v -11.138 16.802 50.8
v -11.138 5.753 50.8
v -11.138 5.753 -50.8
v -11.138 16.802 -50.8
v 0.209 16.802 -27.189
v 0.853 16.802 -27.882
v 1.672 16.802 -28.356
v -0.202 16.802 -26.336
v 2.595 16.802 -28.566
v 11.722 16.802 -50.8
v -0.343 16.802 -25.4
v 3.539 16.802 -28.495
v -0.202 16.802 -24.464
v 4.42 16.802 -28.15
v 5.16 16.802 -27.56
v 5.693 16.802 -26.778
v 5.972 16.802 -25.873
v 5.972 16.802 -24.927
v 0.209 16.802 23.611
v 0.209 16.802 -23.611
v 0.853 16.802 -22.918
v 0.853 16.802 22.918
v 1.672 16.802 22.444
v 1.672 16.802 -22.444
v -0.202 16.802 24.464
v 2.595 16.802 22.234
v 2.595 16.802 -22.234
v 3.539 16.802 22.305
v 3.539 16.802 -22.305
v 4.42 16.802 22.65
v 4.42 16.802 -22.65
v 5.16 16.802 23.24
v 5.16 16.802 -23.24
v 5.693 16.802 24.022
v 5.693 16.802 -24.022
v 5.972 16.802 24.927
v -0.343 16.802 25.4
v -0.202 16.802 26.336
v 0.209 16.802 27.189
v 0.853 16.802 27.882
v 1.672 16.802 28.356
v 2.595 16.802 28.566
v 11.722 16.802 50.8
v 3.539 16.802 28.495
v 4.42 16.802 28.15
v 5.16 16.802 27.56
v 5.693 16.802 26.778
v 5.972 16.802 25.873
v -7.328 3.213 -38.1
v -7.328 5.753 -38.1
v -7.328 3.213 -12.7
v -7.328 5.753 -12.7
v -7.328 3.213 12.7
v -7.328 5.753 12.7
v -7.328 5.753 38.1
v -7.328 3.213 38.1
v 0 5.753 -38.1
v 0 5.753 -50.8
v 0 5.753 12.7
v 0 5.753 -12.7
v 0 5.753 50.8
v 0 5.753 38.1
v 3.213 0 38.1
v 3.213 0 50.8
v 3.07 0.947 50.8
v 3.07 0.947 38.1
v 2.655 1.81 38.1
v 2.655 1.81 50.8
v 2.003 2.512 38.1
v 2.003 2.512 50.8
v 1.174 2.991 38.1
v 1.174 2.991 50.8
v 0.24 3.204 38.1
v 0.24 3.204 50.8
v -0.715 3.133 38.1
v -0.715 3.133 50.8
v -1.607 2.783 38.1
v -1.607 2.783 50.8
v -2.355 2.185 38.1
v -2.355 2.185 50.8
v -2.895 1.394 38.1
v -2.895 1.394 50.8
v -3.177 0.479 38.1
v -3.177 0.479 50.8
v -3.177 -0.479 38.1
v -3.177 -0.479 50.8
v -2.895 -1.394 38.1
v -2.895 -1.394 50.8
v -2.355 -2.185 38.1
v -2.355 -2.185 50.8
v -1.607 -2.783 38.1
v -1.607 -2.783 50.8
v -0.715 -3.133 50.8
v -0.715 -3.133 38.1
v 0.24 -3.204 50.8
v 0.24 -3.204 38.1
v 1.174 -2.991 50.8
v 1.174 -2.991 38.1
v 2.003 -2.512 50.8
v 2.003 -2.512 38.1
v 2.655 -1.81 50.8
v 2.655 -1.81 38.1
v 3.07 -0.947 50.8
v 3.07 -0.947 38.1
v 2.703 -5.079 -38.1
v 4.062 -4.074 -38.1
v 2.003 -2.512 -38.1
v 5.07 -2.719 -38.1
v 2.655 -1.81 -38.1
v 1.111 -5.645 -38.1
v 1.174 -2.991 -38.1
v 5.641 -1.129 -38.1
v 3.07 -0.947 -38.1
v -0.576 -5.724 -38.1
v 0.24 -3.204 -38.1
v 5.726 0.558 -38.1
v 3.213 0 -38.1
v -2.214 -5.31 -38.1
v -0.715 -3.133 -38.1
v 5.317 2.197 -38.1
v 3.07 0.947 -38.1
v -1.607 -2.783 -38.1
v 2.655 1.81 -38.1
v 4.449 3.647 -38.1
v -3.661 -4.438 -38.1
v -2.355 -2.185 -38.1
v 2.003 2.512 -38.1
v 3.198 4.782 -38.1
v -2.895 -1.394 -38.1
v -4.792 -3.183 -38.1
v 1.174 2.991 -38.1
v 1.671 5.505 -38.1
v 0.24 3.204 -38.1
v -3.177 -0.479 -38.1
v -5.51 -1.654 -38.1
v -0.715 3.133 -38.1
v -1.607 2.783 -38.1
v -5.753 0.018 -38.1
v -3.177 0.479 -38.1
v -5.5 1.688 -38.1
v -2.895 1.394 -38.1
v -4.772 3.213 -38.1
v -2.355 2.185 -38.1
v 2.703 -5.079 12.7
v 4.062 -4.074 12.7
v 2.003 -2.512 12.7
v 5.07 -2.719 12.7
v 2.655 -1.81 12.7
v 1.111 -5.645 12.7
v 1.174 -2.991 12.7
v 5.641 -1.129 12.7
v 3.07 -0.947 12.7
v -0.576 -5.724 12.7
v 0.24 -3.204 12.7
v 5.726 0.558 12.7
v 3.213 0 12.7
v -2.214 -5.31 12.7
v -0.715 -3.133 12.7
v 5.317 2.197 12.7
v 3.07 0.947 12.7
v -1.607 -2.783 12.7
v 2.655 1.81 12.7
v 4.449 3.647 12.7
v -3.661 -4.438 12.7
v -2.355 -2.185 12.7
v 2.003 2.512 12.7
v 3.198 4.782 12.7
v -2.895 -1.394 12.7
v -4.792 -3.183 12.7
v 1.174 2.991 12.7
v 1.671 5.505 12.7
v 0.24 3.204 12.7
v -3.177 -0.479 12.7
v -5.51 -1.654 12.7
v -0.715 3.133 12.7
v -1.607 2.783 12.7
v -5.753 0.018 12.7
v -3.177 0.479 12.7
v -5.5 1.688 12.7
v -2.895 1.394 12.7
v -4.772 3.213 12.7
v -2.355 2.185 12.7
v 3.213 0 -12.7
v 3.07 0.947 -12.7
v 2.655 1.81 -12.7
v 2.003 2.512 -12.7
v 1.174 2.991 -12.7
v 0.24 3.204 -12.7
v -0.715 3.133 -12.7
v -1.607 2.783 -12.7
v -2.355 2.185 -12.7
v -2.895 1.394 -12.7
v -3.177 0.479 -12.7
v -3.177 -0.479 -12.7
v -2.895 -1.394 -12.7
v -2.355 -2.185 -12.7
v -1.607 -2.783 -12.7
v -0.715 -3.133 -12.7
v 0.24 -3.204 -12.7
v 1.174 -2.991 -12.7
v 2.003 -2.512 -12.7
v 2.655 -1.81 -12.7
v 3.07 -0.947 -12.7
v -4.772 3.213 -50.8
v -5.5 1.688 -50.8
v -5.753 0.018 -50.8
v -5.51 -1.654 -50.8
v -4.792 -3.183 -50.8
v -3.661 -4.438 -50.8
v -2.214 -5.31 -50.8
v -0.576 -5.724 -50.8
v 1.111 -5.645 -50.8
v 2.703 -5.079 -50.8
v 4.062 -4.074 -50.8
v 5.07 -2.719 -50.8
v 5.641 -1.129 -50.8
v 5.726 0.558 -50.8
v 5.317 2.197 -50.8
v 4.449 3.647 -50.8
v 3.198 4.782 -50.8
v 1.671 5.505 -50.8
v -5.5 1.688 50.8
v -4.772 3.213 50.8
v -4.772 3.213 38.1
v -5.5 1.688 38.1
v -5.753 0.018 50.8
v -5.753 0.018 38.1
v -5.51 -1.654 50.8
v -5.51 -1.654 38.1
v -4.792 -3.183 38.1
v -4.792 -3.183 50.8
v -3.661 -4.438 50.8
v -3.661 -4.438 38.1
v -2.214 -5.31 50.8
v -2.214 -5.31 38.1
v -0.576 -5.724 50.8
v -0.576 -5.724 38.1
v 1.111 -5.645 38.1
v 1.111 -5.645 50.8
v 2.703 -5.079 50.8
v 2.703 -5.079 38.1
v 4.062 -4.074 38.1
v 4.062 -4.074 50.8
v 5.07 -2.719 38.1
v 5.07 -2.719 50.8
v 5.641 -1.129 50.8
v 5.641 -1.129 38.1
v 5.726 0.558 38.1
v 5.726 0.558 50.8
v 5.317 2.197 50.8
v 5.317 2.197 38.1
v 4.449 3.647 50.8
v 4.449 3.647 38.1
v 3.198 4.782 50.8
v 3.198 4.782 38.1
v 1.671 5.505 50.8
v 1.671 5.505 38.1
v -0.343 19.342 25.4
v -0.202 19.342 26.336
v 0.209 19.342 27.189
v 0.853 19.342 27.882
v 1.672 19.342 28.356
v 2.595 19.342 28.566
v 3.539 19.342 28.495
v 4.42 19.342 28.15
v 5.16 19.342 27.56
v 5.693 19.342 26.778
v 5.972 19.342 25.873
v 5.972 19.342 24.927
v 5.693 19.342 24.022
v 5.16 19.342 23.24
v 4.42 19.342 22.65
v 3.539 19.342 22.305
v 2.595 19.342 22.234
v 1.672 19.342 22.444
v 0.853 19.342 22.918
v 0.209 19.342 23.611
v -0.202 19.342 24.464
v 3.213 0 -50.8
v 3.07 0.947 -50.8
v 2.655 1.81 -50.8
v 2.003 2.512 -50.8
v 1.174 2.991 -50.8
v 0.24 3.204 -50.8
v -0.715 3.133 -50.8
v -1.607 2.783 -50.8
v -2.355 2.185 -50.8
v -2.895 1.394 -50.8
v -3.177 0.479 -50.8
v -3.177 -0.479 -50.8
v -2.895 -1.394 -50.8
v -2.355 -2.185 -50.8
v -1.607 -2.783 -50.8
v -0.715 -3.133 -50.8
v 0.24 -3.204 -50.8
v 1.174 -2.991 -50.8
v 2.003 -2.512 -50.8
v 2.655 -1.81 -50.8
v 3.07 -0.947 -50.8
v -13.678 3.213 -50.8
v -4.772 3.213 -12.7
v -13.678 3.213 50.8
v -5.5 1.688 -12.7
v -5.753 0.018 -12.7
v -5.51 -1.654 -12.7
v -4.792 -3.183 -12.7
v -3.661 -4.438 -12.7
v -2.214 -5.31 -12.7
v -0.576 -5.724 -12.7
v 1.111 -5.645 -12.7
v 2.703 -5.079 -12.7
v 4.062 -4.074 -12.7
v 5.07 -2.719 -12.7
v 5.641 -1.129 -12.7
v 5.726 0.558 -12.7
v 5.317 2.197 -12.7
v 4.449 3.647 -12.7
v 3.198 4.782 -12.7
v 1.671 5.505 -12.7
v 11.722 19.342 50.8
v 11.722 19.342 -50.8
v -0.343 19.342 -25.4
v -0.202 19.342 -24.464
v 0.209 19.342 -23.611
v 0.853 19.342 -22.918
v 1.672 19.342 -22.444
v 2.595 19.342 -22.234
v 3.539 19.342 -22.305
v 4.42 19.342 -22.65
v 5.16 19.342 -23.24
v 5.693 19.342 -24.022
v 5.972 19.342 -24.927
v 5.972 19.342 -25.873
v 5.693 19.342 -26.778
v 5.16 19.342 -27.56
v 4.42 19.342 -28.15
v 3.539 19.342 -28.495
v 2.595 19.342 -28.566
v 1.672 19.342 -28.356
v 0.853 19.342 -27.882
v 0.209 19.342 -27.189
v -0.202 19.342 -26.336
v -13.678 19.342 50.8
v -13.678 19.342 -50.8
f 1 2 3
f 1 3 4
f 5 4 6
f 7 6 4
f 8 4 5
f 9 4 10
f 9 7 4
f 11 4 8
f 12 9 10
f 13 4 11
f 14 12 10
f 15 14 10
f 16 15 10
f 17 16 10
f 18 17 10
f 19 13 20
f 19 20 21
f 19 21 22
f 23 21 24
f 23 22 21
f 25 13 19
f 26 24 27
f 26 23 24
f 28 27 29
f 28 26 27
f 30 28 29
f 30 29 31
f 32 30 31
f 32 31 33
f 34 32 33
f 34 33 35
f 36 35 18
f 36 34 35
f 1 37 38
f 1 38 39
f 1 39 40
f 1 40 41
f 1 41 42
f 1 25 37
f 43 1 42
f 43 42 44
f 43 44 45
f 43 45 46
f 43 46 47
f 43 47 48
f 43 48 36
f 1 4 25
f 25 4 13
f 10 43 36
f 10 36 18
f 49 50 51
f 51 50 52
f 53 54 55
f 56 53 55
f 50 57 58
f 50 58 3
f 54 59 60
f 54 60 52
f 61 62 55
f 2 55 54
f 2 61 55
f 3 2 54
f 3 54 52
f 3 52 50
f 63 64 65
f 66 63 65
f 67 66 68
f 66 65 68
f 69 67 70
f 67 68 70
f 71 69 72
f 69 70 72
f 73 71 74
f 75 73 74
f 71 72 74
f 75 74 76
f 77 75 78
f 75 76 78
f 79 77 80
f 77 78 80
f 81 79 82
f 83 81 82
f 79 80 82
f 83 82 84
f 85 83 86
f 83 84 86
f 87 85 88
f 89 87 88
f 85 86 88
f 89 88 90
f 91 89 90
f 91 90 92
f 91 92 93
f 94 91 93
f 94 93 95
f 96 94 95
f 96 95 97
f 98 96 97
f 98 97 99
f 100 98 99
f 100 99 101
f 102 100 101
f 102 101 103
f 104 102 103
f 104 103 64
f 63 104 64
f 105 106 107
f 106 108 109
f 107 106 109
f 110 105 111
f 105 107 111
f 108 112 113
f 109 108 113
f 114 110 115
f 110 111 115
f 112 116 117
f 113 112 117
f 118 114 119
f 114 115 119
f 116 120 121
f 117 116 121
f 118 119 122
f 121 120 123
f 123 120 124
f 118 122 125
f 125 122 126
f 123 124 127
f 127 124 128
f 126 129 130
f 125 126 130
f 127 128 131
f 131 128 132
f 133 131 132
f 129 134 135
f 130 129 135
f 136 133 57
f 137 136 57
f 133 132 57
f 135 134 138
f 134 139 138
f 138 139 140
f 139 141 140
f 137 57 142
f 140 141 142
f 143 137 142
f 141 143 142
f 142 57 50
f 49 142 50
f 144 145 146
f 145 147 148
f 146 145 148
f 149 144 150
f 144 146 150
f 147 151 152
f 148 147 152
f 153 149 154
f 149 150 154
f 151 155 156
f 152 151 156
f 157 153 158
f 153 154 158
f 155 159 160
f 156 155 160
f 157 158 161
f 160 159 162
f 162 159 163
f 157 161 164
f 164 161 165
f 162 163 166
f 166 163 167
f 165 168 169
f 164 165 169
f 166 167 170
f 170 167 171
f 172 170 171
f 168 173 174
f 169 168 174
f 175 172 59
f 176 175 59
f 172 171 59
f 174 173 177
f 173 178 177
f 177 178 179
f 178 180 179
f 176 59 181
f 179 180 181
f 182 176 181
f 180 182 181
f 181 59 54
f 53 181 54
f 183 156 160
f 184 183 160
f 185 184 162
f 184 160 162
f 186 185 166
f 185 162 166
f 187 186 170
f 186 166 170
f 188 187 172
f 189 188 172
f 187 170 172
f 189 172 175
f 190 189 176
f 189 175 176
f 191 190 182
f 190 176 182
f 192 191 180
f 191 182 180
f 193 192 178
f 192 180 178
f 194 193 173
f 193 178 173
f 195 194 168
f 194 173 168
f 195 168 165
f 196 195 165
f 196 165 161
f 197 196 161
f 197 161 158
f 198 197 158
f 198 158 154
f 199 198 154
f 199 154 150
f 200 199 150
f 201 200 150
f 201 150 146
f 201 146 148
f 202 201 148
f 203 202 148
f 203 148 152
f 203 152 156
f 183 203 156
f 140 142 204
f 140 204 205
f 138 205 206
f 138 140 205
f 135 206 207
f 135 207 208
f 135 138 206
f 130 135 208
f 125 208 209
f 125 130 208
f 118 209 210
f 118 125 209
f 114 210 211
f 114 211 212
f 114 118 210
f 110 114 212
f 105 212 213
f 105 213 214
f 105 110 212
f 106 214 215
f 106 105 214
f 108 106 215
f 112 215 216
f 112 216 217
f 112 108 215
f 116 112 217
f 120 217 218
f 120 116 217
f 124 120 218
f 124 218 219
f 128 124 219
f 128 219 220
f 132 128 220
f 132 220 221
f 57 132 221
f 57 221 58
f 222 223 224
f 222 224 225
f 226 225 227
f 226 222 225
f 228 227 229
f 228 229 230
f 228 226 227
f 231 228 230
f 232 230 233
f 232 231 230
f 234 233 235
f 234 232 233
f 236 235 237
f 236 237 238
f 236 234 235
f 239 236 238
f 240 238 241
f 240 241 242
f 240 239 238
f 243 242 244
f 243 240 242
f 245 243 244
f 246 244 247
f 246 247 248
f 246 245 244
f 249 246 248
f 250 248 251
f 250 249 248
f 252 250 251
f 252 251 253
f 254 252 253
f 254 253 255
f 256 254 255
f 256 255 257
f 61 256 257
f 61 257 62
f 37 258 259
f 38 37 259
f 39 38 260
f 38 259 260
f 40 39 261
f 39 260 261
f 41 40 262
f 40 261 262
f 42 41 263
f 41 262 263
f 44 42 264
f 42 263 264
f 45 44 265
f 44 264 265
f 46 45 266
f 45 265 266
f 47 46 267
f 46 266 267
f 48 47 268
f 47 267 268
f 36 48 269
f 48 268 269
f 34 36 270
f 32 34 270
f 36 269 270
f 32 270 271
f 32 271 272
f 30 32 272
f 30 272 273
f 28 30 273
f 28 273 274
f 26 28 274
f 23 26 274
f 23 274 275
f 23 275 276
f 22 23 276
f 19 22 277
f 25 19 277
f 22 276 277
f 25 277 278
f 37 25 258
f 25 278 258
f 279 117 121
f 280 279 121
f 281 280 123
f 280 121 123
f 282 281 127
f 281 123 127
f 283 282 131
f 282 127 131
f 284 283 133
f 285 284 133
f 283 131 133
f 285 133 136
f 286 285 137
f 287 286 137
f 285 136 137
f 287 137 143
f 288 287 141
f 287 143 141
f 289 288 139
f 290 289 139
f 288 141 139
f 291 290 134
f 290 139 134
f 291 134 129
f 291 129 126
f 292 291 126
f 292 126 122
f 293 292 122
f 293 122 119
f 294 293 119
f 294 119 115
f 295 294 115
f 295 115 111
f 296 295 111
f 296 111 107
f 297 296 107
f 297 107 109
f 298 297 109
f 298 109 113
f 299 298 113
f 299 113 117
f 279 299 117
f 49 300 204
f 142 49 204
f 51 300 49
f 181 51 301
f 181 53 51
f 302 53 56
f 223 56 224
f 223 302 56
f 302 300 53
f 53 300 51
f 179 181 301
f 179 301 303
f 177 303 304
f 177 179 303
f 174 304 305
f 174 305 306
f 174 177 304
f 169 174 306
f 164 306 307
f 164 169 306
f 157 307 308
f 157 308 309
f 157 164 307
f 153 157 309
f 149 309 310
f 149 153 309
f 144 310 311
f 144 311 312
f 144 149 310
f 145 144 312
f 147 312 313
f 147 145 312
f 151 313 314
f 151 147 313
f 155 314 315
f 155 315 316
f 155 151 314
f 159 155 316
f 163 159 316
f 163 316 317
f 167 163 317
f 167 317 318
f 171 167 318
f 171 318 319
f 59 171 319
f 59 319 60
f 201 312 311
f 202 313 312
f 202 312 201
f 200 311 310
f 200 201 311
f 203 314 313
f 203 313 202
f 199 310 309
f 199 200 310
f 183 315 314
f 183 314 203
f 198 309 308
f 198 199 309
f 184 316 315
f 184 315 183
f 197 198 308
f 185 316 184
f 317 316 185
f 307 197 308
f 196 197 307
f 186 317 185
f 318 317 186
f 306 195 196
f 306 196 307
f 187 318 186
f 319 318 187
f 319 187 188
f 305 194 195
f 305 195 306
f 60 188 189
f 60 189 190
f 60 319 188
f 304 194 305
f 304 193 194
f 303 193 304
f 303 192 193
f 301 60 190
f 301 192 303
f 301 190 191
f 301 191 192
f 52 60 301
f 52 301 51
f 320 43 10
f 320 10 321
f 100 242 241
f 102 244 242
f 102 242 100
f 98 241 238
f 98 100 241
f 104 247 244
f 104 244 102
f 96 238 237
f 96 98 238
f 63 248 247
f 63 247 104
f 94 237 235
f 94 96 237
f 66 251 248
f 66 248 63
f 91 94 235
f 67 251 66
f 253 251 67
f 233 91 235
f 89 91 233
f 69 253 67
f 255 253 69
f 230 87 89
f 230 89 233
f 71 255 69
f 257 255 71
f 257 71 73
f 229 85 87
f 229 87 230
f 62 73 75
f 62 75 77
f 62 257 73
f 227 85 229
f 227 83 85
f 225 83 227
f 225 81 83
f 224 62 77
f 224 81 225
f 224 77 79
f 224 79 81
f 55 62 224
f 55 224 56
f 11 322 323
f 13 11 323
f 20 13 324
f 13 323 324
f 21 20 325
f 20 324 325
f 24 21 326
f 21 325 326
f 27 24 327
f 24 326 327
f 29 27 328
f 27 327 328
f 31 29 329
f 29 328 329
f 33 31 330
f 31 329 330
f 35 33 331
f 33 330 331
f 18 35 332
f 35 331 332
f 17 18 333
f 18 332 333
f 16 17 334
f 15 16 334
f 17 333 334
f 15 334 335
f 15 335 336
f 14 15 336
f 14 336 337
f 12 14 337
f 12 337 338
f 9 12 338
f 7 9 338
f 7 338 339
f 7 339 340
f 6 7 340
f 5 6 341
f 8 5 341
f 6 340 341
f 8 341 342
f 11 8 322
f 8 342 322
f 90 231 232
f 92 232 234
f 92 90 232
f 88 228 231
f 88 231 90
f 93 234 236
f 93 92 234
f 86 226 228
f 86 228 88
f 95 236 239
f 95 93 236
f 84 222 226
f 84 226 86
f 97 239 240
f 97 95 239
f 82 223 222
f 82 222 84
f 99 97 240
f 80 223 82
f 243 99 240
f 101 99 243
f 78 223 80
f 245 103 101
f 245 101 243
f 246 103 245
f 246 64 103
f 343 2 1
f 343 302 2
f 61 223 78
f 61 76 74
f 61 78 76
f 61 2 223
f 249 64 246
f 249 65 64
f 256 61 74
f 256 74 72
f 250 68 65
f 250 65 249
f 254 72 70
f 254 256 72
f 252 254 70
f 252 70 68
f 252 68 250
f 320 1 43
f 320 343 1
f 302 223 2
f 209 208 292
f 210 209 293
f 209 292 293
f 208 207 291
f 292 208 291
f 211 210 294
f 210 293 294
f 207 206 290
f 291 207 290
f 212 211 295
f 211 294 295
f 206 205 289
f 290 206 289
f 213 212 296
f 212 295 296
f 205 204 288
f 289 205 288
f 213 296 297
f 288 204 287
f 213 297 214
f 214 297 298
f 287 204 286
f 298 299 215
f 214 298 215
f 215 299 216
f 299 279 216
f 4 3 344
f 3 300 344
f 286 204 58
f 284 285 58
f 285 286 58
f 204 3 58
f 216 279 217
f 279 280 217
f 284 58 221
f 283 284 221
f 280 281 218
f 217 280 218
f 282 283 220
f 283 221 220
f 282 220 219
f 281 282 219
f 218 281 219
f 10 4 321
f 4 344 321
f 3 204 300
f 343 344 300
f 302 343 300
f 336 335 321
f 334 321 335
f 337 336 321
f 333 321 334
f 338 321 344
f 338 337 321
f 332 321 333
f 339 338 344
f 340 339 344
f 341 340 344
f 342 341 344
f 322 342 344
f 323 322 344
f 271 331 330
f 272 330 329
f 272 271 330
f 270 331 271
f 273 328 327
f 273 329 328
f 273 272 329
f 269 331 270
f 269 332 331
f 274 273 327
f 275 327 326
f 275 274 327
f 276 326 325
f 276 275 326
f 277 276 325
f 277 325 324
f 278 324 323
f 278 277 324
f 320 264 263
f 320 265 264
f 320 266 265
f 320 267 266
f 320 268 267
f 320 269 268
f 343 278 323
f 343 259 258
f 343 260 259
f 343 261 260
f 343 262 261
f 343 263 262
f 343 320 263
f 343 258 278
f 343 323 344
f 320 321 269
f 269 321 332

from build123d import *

# Parameters (mm, degrees)
F1_DEPTH = 50.8
F2_W     = 25.4
F2_H     = 25.4
F3_DEPTH = 11.5072
F4_R     = 3.2131
F5_DEPTH = 101.601
F6_R     = 3.175
F7_DEPTH = 2.54


with BuildPart() as f1:
    # F0 (on Top) → F1 (new body, symmetric)
    with BuildSketch(Plane.XY):
        with BuildLine():
            ThreePointArc((-4.772227, 3.2131), (2.703042, -5.078555), (0, 5.7531))
            Line((0, 5.7531), (-11.1379, 5.7531))
            Line((-11.1379, 5.7531), (-11.1379, 16.8021))
            Line((-11.1379, 16.8021), (11.7221, 16.8021))
            Line((11.7221, 16.8021), (11.7221, 19.3421))
            Line((11.7221, 19.3421), (-13.6779, 19.3421))
            Line((-13.6779, 19.3421), (-13.6779, 3.2131))
            Line((-13.6779, 3.2131), (-4.772227, 3.2131))
        make_face()
    extrude(amount=F1_DEPTH, both=True)

    # F2 (on face) → F3 (cut, through all)
    with BuildSketch(Plane(origin=(0, 5.7531, 0), x_dir=(-1, 0, 0), z_dir=(0, 1, 0))):
        with Locations((-5.3721, 25.4)):
            Rectangle(F2_W, F2_H)
        with Locations((-5.3721, -25.4)):
            Rectangle(F2_W, F2_H)
    extrude(amount=-F3_DEPTH, mode=Mode.SUBTRACT)

    # F4 (on face) → F5 (cut, through all)
    with BuildSketch(Plane.XY.offset(50.8)):
        Circle(F4_R)
    extrude(amount=-F5_DEPTH, mode=Mode.SUBTRACT)

    # F6 (on face) → F7 (cut, through all)
    with BuildSketch(Plane(origin=(0, 19.3421, 0), x_dir=(-1, 0, 0), z_dir=(0, 1, 0))):
        with Locations((-2.8321, 25.4)):
            Circle(F6_R)
        with Locations((-2.8321, -25.4)):
            Circle(F6_R)
    extrude(amount=-F7_DEPTH, mode=Mode.SUBTRACT)


solid = f1.part
